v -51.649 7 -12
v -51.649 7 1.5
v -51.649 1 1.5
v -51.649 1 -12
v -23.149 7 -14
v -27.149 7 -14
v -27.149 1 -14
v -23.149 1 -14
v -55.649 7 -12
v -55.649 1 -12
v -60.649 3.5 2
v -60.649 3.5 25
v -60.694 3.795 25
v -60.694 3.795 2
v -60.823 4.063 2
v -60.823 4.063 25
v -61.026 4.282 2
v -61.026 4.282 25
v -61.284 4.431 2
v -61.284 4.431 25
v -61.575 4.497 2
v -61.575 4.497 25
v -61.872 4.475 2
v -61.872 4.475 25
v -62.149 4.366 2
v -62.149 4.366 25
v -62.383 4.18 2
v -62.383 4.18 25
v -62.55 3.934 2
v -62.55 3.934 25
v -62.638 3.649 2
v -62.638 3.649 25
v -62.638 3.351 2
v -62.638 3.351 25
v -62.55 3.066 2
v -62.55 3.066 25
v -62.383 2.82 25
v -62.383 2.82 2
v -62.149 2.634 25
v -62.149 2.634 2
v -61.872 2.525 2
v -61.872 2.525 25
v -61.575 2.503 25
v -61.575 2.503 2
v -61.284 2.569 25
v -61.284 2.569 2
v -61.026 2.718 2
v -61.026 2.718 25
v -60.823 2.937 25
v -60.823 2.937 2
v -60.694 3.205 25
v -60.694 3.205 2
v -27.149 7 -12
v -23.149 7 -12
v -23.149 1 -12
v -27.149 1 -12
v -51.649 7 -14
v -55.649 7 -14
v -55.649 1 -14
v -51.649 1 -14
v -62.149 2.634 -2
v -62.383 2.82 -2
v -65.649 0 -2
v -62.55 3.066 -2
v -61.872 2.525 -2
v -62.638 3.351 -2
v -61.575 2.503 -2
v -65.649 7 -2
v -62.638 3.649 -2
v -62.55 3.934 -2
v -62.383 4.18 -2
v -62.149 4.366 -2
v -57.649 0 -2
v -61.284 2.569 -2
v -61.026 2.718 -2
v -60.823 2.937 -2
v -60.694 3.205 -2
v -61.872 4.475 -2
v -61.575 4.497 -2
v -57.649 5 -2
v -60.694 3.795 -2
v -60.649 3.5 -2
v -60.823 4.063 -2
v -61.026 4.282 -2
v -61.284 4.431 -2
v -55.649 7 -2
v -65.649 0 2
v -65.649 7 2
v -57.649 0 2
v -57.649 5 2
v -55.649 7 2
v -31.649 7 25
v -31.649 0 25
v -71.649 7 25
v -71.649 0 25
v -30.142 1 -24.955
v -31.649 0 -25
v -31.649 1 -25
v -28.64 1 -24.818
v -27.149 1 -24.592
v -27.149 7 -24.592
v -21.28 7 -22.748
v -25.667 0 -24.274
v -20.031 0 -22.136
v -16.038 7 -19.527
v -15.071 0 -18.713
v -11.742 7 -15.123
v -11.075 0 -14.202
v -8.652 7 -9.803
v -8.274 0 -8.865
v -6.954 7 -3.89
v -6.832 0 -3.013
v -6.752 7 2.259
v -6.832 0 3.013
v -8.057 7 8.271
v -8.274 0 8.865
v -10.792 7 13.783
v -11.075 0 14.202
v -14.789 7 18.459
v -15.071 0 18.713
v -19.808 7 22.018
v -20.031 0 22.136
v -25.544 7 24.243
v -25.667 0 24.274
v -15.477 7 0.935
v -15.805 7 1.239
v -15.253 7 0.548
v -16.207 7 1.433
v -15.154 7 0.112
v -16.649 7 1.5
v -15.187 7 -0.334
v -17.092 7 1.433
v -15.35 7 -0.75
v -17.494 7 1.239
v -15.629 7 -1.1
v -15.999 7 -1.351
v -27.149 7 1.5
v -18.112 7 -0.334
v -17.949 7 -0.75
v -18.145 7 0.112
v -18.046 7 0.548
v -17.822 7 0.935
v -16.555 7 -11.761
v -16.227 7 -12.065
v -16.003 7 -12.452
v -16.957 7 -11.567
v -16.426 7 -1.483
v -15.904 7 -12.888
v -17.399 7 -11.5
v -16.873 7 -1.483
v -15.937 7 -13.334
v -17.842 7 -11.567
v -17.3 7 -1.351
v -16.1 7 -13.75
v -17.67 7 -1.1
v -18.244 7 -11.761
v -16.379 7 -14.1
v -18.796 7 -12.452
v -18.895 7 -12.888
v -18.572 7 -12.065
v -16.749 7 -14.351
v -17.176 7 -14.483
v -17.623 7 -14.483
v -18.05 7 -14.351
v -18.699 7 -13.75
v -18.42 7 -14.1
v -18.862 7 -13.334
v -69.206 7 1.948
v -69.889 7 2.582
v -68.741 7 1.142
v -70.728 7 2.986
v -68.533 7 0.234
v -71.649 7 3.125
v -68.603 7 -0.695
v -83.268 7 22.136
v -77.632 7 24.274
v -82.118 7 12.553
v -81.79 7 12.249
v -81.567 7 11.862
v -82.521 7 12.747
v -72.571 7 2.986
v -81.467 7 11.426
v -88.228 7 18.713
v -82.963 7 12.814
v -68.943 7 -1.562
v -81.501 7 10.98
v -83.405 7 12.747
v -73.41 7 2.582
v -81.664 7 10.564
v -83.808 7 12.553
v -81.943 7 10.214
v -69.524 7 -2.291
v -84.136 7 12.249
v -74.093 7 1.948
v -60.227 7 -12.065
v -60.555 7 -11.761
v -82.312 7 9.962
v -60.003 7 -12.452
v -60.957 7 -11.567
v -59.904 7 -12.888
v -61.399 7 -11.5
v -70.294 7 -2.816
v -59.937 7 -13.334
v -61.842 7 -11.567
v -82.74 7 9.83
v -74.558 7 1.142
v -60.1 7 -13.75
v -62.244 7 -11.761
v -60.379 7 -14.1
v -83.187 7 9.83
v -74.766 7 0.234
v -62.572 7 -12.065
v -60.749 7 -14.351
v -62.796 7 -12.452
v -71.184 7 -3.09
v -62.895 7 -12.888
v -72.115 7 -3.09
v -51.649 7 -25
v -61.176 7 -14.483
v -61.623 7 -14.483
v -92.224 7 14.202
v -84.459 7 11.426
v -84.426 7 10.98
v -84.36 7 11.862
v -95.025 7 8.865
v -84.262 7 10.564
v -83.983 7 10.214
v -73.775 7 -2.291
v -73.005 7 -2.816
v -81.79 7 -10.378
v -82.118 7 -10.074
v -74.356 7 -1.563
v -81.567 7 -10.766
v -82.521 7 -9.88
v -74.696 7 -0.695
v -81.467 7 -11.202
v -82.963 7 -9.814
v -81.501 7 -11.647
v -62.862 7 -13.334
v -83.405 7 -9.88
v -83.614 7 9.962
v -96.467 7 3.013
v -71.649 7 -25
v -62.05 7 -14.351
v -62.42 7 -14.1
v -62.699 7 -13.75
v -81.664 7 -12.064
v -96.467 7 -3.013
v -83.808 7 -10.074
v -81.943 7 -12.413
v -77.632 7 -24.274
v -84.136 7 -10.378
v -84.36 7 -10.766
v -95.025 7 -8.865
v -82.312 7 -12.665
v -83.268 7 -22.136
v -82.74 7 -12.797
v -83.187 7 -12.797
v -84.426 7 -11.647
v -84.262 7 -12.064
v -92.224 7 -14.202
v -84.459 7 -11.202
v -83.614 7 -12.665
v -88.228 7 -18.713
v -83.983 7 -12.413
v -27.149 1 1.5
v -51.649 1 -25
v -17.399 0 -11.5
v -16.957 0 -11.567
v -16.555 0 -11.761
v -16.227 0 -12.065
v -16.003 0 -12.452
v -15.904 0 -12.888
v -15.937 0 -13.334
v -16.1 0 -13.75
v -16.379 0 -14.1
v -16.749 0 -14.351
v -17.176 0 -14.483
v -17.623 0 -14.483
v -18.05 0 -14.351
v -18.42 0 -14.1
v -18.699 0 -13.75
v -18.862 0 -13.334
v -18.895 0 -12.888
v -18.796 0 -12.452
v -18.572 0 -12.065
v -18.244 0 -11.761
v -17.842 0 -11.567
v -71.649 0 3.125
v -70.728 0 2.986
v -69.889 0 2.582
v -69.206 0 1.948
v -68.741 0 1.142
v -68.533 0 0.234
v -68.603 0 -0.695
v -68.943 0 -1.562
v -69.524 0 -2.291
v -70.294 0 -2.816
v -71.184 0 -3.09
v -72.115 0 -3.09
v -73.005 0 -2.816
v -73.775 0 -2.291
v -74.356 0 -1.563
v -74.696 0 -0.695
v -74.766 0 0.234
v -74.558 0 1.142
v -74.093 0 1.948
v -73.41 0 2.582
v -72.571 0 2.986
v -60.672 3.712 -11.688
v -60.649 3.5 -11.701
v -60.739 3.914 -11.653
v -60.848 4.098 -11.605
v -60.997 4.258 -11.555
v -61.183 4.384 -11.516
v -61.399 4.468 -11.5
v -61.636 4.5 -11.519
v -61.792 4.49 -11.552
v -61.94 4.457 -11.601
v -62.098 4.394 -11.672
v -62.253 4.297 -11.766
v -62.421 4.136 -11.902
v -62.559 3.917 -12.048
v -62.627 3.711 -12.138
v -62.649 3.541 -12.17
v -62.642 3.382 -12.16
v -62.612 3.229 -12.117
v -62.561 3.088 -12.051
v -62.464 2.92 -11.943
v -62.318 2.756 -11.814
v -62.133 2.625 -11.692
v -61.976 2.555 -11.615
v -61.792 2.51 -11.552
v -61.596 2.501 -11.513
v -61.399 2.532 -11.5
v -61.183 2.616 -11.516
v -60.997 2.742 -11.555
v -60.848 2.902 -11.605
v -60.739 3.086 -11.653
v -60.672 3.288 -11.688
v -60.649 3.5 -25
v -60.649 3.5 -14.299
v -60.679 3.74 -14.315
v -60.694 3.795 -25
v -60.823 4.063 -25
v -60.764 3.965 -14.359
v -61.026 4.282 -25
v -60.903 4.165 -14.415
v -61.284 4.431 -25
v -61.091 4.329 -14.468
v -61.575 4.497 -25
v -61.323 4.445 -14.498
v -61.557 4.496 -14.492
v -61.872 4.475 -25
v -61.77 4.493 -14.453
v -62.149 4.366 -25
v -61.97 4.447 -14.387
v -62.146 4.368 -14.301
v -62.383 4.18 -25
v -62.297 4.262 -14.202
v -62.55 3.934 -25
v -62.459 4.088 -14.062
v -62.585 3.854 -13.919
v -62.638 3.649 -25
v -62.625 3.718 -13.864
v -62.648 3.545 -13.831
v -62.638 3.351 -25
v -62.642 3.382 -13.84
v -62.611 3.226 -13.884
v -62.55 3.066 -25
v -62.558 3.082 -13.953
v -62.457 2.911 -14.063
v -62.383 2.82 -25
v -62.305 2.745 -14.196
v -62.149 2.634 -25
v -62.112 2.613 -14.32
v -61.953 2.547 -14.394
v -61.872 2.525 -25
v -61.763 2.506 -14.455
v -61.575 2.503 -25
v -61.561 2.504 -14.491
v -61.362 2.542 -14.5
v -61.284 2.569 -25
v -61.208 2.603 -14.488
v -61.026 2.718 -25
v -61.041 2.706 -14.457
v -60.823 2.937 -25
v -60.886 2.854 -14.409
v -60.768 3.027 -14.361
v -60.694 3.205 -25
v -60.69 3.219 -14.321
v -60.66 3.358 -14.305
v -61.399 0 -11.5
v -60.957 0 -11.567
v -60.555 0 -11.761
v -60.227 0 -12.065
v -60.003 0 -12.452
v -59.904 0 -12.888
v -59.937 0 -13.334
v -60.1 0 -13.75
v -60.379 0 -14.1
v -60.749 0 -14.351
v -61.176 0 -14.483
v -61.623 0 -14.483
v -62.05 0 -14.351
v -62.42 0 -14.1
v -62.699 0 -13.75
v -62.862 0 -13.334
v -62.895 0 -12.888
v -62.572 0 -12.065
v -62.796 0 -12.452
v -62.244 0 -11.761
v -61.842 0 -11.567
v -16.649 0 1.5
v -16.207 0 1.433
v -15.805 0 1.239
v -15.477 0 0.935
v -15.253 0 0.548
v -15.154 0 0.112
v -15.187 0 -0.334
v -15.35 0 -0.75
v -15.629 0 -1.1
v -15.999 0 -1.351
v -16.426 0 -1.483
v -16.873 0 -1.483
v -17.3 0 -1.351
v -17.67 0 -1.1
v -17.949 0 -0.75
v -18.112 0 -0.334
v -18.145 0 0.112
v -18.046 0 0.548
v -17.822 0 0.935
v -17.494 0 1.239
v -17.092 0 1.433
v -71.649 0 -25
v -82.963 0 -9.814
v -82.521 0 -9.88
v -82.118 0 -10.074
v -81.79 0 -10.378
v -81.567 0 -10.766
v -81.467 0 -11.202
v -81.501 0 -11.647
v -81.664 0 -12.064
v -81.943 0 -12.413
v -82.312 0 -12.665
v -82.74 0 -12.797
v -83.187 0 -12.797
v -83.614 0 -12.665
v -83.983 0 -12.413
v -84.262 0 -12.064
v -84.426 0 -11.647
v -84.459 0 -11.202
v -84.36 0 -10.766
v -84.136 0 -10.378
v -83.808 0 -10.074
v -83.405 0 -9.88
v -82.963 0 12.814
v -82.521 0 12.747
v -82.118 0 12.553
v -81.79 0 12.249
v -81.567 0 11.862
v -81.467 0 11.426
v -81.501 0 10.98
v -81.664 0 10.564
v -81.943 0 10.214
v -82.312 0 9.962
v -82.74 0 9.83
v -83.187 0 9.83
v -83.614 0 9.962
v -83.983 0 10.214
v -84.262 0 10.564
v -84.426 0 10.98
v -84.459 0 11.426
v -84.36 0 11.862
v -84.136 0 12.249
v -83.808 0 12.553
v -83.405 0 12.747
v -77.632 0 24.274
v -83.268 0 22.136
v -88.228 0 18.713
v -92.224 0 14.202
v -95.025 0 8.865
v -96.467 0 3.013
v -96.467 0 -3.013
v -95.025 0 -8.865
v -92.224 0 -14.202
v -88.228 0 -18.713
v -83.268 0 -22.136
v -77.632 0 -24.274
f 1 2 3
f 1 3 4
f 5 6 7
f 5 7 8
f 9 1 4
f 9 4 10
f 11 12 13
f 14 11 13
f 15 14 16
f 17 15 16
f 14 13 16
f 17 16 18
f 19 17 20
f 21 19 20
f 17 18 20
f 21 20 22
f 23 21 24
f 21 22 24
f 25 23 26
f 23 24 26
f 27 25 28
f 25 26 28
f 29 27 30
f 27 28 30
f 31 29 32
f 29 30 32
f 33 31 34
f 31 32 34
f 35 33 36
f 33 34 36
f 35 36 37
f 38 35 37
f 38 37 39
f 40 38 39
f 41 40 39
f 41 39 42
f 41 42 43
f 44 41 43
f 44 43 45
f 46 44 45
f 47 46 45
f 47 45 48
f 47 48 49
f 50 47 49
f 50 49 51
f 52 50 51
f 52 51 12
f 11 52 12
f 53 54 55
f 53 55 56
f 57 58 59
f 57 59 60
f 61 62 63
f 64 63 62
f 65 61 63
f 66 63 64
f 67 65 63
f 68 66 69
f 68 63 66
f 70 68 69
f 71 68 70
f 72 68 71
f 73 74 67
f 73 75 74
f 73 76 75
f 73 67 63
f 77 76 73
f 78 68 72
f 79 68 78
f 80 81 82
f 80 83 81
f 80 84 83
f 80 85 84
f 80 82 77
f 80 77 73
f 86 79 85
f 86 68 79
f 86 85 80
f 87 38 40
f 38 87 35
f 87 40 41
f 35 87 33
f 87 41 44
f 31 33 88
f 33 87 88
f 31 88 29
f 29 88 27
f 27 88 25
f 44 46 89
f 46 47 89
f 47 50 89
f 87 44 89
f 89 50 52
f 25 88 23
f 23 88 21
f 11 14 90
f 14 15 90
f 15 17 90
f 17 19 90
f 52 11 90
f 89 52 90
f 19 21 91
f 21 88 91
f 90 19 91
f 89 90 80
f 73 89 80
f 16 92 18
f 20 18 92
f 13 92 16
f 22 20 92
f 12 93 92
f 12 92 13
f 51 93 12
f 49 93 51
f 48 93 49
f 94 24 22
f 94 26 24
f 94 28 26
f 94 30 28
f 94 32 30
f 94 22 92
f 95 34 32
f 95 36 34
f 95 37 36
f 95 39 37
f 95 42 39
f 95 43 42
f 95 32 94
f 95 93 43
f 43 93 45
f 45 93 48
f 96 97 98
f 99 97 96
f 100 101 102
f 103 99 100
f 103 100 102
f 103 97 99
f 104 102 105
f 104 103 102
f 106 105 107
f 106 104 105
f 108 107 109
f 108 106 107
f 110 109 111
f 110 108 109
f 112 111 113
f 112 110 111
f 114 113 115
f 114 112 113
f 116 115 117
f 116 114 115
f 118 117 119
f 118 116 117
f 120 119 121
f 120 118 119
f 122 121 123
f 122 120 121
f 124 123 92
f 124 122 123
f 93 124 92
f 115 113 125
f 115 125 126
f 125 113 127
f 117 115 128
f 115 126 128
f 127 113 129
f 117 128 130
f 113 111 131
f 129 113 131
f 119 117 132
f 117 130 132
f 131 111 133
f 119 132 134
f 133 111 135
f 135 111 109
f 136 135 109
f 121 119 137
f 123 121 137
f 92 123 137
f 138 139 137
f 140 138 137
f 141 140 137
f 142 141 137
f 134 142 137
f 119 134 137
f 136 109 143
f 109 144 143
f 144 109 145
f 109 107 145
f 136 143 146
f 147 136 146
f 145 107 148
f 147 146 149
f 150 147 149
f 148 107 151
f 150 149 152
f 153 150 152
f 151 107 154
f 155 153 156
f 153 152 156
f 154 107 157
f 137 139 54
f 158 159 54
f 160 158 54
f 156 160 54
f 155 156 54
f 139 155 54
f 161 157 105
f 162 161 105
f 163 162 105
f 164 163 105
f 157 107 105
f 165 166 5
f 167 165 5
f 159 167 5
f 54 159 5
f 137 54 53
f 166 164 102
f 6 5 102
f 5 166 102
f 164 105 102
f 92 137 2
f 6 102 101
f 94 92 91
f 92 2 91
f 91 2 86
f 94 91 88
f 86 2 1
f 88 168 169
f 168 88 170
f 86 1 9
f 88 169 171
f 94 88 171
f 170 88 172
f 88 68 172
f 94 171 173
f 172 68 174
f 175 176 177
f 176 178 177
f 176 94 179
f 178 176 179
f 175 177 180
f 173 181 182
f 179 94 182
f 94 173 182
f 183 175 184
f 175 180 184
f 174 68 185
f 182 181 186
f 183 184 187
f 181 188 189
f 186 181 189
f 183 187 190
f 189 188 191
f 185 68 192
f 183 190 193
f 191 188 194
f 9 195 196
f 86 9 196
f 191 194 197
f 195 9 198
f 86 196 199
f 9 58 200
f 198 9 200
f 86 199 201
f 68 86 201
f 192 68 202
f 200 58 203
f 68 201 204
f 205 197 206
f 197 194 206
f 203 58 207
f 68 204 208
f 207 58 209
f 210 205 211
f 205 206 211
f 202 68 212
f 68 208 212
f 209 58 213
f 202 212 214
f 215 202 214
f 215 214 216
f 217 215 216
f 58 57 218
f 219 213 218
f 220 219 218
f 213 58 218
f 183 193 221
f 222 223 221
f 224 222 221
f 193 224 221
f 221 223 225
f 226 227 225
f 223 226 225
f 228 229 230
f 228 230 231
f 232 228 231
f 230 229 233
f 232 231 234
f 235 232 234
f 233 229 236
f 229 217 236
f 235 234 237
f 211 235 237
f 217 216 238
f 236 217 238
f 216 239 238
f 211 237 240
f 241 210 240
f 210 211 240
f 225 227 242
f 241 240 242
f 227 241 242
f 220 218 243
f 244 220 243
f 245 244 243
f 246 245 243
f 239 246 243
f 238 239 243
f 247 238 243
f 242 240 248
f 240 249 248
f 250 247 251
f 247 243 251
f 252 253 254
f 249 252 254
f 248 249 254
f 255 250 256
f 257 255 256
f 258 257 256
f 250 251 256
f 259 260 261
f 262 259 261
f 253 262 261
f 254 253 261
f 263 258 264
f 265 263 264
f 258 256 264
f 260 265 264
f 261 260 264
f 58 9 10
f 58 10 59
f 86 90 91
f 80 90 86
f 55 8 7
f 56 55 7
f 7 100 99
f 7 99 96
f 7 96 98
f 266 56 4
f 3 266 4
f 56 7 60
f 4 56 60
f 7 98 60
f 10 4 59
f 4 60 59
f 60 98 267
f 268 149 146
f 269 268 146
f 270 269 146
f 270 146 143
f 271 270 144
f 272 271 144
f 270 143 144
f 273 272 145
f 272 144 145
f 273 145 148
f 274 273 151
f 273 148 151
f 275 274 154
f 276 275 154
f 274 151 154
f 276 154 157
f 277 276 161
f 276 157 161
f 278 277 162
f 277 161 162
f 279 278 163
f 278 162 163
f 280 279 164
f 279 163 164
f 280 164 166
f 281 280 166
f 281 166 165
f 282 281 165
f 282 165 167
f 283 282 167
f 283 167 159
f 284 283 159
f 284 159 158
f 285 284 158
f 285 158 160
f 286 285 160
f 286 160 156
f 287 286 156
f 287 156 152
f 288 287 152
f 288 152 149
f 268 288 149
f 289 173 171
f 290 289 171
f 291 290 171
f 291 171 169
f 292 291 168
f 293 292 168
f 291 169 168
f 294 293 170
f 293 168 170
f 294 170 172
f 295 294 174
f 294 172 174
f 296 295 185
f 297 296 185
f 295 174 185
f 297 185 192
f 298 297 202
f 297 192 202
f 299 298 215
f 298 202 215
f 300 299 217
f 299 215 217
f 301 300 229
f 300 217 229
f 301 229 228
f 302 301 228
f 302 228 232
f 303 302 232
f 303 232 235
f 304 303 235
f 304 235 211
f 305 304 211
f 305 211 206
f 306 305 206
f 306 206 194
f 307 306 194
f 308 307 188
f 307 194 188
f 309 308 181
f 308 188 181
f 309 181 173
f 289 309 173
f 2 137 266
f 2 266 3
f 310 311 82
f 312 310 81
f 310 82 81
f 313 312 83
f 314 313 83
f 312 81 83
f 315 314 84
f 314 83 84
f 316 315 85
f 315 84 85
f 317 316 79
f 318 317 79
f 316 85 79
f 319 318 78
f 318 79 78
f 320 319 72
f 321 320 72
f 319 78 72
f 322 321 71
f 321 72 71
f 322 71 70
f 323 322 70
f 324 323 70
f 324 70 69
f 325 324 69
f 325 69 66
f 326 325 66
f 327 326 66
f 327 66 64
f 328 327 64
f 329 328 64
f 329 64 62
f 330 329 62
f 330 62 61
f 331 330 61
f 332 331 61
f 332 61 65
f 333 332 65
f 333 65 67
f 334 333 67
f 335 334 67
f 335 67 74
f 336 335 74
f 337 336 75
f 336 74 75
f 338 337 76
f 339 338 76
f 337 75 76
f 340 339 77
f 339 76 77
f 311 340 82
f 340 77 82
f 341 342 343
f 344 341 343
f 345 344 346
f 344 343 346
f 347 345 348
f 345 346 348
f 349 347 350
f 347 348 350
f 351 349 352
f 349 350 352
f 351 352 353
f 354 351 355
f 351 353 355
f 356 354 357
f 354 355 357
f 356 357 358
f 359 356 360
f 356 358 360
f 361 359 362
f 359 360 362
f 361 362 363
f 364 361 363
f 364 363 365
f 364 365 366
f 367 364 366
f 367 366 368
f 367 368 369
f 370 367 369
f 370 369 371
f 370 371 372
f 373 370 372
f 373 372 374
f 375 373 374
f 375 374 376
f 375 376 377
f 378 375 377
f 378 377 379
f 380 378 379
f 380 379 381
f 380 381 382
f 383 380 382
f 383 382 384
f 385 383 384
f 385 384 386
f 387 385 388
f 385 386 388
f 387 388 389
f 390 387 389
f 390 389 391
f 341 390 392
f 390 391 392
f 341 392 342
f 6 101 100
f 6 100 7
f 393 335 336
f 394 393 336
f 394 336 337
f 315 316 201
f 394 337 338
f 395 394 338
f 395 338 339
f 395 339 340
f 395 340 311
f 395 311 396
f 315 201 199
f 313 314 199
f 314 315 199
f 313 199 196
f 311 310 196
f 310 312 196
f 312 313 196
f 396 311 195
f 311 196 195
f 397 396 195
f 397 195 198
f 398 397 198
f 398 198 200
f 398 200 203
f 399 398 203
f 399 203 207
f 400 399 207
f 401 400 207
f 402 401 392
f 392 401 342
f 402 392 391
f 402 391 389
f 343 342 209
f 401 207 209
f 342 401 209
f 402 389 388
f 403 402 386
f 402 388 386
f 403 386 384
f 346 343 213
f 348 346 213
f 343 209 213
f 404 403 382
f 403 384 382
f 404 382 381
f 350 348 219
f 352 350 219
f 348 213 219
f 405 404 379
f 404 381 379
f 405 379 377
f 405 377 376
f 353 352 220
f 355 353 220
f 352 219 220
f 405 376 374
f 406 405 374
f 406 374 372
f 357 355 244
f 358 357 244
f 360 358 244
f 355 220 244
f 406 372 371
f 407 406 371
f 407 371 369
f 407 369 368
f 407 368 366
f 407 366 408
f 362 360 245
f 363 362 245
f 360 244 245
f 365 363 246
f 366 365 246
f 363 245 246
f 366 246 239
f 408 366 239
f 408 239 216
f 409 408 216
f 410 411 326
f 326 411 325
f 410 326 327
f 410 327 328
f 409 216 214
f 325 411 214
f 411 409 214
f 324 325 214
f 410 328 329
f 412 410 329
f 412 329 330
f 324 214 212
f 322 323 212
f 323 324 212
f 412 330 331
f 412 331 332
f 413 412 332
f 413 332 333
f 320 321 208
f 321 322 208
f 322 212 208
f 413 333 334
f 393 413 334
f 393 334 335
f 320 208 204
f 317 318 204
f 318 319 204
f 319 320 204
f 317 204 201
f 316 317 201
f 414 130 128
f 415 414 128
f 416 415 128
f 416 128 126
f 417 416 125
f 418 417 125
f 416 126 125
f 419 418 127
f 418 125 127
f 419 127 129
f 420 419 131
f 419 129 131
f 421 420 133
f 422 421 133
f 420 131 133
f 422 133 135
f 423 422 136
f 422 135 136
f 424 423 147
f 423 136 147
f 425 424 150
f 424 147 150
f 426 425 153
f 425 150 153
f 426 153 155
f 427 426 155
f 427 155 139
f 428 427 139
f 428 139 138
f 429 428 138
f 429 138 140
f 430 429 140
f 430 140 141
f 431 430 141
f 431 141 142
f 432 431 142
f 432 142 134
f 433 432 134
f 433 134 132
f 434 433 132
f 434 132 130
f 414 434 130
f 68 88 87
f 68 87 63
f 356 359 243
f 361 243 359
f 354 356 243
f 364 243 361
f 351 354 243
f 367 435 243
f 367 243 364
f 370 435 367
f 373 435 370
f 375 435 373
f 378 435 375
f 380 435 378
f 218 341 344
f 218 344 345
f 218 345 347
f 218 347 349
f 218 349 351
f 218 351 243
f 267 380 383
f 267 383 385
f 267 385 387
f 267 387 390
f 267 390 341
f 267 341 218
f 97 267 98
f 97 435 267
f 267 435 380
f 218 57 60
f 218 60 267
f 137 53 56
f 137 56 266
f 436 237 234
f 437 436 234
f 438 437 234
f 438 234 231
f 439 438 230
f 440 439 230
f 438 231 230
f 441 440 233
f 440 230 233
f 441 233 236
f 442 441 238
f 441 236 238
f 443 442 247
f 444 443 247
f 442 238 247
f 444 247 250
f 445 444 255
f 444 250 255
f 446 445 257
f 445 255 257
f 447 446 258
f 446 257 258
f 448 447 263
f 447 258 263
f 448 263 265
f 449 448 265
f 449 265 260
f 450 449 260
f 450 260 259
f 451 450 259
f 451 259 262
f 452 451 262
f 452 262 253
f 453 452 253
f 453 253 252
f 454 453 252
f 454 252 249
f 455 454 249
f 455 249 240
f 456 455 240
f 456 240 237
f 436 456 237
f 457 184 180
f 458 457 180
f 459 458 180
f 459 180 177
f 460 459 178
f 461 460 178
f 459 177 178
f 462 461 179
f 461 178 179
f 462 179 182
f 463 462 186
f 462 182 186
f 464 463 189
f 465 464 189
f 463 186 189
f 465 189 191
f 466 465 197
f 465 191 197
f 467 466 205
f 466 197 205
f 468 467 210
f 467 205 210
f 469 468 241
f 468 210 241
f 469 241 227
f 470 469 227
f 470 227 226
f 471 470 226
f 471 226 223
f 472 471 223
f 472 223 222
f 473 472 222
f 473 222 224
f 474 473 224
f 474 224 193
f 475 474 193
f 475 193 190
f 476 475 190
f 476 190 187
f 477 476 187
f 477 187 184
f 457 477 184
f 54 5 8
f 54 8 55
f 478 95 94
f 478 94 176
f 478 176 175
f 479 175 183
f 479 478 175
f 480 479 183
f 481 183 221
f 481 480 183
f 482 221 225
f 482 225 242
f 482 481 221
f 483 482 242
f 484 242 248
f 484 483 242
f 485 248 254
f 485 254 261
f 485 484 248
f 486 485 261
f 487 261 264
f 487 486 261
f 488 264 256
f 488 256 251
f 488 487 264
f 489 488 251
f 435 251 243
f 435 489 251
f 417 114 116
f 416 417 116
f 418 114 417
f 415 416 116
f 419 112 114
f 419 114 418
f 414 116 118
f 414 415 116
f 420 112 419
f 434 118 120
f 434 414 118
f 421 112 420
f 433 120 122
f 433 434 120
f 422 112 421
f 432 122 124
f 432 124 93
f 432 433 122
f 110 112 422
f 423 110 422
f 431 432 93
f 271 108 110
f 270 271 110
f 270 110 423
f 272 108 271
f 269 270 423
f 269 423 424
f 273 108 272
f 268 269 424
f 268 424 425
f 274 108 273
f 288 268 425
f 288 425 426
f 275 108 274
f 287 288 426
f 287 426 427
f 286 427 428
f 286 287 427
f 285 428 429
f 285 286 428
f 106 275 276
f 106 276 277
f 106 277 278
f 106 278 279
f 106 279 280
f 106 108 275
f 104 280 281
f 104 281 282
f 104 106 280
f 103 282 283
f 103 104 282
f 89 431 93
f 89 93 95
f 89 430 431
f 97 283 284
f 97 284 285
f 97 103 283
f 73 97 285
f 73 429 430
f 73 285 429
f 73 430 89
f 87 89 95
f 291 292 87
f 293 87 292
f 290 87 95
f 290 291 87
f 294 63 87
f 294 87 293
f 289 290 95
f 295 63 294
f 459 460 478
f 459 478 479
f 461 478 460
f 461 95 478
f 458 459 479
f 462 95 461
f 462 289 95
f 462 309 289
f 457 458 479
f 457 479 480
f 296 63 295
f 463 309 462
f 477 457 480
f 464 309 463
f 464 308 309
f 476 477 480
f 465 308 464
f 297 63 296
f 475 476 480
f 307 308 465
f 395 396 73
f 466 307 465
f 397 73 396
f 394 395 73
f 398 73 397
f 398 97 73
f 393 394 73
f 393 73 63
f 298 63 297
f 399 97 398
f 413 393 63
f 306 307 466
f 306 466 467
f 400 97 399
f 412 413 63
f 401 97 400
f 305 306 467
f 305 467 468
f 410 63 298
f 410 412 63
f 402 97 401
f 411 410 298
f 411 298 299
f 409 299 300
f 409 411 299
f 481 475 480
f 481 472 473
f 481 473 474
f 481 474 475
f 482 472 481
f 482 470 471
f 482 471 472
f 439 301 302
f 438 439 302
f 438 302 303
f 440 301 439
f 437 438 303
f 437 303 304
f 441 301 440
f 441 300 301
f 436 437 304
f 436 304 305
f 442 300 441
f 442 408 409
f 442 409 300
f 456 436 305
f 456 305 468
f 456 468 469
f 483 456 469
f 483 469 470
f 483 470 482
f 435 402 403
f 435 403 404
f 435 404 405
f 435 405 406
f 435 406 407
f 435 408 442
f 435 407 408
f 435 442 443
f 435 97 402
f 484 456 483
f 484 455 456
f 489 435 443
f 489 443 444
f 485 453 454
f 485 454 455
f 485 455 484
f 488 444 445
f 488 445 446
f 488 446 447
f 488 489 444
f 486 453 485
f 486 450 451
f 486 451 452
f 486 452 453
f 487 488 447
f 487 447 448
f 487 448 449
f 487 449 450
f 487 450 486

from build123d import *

# Parameters (mm, degrees)
BOSS_EXTRU_1_DEPTH      = 7
ESQUISSE2_R             = 3.125
ENL_V_MAT_EXTRU_1_DEPTH = 7
ENL_V_MAT_EXTRU_2_DEPTH = 6
ENL_V_MAT_EXTRU_3_REACH = 102.076
ESQUISSE4_W             = 8
ESQUISSE4_H             = 4
CHANFREIN1_SIZE         = 2
ESQUISSE5_R             = 1
ENL_V_MAT_EXTRU_4_DEPTH = 110.041839956
ESQUISSE7_R             = 1.5
ENL_V_MAT_EXTRU_6_DEPTH = 8


with BuildPart() as part:
    # Esquisse1 → Boss.-Extru.1 (new body)
    with BuildSketch(Plane(origin=(0, 0, 0), x_dir=(1, 0, 0), z_dir=(0, 1, 0))):
        with BuildLine():
            Line((-71.649484536, 25), (-31.649484536, 25))
            ThreePointArc((-31.649484536, 25), (-6.649484536, 0), (-31.649484536, -25))
            Line((-31.649484536, -25), (-71.649484536, -25))
            ThreePointArc((-71.649484536, -25), (-96.649484536, 0), (-71.649484536, 25))
        make_face()
    extrude(amount=BOSS_EXTRU_1_DEPTH)

    # Esquisse2 → Enlèv. mat.-Extru.1 (cut)
    with BuildSketch(Plane(origin=(0, 7, 0), x_dir=(1, 0, 0), z_dir=(0, 1, 0))):
        with Locations(Location((-71.649484536, 0, 0), (0, 0, 270))):
            Circle(ESQUISSE2_R)
    extrude(amount=-ENL_V_MAT_EXTRU_1_DEPTH, mode=Mode.SUBTRACT)

    # Esquisse3 → Enlèv. mat.-Extru.2 (cut)
    with BuildSketch(Plane(origin=(0, 7, 0), x_dir=(1, 0, 0), z_dir=(0, 1, 0))):
        Polygon((-51.649484536, 30.5), (-27.149484536, 30.5), (-27.149484536, 14), (-23.149484536, 14), (-23.149484536, 12), (-27.149484536, 12), (-27.149484536, -1.5), (-51.649484536, -1.5), (-51.649484536, 12), (-55.649484536, 12), (-55.649484536, 14), (-51.649484536, 14), align=None)
    extrude(amount=-ENL_V_MAT_EXTRU_2_DEPTH, mode=Mode.SUBTRACT)

    # Esquisse4 → Enlèv. mat.-Extru.3 (cut, up to next)
    with BuildSketch(Plane(origin=(0, 7, 0), x_dir=(1, 0, 0), z_dir=(0, 1, 0)), mode=Mode.PRIVATE) as enl_v_mat_extru_3_sk1:
        with Locations((-61.649484536, 0)):
            Rectangle(ESQUISSE4_W, ESQUISSE4_H)
    enl_v_mat_extru_3_tool1 = extrude(enl_v_mat_extru_3_sk1.sketch, amount=-ENL_V_MAT_EXTRU_3_REACH, mode=Mode.PRIVATE) & part.part
    add(enl_v_mat_extru_3_tool1.solids().sort_by_distance((-61.649485, 7, 0))[0], mode=Mode.SUBTRACT)

    # Chanfrein1
    chanfrein1_edges = [part.edges().sort_by_distance(p)[0] for p in [
        (-57.649484536, 7, 0),
    ]]
    chamfer(chanfrein1_edges, length=CHANFREIN1_SIZE)

    # Esquisse5 → Enlèv. mat.-Extru.4 (cut, through all)
    with BuildSketch(Plane.XY.offset(25)):
        with Locations((-61.649484536, 3.5)):
            Circle(ESQUISSE5_R)
    extrude(amount=-ENL_V_MAT_EXTRU_4_DEPTH, mode=Mode.SUBTRACT)

    # Esquisse7 → Enlèv. mat.-Extru.6 (cut)
    with BuildSketch(Plane(origin=(0, 7, 0), x_dir=(1, 0, 0), z_dir=(0, 1, 0))):
        with Locations(Location((-16.649484536, 0, 0), (0, 0, 270))):
            Circle(ESQUISSE7_R)
        with Locations(Location((-82.963193035, 11.313708499, 0), (0, 0, 270))):
            Circle(ESQUISSE7_R)
        with Locations(Location((-82.963193035, -11.313708499, 0), (0, 0, 270))):
            Circle(ESQUISSE7_R)
        with Locations(Location((-61.399484536, 13, 0), (0, 0, 270))):
            Circle(ESQUISSE7_R)
        with Locations(Location((-17.399484536, 13, 0), (0, 0, 270))):
            Circle(ESQUISSE7_R)
    extrude(amount=-ENL_V_MAT_EXTRU_6_DEPTH, mode=Mode.SUBTRACT)


solid = part.part
